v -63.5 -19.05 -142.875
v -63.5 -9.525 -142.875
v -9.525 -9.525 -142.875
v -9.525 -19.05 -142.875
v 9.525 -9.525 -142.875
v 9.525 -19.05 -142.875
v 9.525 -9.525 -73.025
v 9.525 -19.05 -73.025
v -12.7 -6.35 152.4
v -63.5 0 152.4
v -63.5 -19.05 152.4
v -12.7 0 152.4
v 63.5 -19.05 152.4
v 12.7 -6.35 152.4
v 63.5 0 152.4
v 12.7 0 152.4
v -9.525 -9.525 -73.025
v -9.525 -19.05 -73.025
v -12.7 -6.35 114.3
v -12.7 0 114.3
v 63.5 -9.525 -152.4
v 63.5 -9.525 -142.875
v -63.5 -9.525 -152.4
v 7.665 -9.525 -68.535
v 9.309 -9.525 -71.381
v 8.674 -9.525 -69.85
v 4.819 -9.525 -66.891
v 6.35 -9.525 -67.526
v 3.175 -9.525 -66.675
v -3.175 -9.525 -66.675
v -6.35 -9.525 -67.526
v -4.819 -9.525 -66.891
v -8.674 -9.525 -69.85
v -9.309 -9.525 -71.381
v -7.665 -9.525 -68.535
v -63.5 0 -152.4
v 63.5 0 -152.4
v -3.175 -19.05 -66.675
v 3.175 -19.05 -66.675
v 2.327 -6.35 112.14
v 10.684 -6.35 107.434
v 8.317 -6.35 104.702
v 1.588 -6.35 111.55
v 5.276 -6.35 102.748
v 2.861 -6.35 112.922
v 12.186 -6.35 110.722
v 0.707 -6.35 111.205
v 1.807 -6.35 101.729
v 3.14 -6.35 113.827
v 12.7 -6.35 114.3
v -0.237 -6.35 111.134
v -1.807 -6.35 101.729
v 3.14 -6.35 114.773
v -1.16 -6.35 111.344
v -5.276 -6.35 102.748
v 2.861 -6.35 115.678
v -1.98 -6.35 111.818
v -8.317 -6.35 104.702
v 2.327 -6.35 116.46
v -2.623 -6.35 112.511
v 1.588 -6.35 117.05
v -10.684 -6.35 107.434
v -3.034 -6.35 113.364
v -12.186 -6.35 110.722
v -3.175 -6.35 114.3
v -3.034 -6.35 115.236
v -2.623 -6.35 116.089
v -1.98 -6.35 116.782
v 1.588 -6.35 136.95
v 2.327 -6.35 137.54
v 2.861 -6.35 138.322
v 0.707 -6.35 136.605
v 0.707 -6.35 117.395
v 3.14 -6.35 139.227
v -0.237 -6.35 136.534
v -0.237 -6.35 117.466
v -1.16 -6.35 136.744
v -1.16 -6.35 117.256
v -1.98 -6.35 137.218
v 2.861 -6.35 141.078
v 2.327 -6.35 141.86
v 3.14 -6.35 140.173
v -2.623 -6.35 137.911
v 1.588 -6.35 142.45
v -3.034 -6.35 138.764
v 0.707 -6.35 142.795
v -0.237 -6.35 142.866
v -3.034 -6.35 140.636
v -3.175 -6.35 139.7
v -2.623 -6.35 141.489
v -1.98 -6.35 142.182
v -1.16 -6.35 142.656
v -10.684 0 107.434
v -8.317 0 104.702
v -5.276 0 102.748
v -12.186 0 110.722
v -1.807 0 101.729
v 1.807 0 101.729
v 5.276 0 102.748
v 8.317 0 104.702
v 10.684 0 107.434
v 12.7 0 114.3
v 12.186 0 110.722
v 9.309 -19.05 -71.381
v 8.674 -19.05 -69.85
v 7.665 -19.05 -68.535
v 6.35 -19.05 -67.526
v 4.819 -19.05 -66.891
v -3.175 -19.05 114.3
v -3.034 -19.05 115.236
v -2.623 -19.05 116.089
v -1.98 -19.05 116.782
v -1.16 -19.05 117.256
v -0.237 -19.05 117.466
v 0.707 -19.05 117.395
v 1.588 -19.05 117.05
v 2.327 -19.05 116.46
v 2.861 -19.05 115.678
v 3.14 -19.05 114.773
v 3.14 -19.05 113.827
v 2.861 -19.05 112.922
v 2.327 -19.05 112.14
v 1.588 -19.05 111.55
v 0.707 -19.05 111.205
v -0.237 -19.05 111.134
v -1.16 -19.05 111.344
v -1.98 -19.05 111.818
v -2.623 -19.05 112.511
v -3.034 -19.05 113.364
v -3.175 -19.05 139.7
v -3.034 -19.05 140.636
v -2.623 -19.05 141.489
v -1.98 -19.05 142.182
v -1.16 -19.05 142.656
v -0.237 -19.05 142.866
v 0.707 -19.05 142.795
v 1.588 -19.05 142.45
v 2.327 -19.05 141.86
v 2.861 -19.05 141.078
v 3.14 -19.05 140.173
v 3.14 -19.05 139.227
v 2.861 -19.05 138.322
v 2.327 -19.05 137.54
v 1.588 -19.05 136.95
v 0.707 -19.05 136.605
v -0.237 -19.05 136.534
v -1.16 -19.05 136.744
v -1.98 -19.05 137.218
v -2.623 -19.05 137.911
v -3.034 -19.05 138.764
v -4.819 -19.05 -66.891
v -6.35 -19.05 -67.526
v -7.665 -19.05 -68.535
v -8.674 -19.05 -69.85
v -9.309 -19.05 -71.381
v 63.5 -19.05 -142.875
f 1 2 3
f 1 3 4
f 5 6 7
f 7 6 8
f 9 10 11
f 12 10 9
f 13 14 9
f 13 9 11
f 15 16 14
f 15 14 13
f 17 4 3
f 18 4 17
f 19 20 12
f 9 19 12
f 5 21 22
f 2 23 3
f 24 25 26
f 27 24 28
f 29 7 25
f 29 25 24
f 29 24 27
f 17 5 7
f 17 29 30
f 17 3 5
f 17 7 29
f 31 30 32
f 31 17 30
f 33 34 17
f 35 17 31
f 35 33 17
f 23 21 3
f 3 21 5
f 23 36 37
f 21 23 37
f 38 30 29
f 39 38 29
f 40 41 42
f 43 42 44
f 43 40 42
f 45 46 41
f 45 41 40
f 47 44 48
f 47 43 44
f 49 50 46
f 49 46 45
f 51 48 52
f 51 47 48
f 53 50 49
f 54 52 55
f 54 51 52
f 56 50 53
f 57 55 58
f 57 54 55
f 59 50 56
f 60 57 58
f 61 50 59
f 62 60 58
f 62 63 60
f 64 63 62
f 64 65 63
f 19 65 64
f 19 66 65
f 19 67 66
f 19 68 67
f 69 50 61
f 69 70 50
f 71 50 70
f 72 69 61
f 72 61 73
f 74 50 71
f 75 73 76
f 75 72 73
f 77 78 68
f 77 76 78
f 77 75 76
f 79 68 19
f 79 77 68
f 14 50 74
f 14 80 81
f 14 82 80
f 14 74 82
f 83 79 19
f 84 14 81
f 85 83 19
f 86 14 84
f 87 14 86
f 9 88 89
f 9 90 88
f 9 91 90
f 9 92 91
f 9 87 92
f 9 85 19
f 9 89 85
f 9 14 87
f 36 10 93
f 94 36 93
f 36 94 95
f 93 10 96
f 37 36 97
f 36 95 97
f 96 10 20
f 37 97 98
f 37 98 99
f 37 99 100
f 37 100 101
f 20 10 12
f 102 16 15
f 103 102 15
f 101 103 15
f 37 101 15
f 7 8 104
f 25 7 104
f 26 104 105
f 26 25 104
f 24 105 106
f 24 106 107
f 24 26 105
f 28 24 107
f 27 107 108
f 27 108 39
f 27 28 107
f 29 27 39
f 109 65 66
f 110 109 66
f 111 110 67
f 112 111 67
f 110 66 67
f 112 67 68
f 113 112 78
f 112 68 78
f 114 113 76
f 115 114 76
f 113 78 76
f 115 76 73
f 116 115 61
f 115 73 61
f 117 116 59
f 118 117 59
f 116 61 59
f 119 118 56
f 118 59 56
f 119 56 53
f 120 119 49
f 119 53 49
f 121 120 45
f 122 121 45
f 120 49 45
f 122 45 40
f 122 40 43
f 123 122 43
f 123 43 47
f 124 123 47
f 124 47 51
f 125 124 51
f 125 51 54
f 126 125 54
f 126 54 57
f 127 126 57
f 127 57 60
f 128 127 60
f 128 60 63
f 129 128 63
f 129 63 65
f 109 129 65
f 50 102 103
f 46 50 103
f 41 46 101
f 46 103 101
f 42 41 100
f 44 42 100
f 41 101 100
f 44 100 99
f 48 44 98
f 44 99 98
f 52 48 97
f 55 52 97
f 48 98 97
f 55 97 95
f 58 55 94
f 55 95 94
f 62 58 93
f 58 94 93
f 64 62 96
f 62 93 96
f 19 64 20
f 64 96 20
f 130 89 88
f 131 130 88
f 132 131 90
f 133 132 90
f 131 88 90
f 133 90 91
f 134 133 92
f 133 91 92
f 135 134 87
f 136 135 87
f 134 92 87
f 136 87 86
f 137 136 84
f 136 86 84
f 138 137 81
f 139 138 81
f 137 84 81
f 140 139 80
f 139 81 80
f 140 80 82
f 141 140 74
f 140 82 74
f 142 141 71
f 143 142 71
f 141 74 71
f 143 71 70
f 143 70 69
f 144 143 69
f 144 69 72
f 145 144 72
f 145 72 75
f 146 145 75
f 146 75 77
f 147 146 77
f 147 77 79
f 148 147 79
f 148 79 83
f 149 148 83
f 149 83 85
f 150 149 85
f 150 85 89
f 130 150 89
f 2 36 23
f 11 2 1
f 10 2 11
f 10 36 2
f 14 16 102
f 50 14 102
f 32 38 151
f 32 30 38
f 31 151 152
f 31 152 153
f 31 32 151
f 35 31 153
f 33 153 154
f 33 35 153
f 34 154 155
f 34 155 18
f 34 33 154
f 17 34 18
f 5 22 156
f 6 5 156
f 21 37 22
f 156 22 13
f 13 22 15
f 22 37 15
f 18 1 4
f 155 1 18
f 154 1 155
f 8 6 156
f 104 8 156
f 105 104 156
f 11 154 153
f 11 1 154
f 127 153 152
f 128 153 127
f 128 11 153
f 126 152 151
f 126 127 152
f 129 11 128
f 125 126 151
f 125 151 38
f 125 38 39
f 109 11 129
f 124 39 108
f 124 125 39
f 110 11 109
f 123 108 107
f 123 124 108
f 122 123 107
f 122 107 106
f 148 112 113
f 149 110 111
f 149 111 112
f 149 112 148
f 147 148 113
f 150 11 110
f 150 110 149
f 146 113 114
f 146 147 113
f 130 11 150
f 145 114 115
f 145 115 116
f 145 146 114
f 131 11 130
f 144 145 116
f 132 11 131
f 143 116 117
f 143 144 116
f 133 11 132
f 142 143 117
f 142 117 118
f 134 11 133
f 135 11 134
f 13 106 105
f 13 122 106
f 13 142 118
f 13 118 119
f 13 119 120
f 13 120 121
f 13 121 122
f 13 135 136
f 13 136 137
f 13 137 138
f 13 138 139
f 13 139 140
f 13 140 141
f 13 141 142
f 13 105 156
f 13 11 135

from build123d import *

# Parameters (mm, degrees)
F0_W     = 127
F0_H     = 304.8
F1_DEPTH = 19.05
F3_DEPTH = 6.35
F4_R     = 3.175
F5_DEPTH = 12.701
F6_W     = 25.4
F6_H     = 9.525
F7_DEPTH = 127.001
F8_W     = 19.05
F8_H     = 76.2
F9_DEPTH = 9.525
F10_R    = 6.35


with BuildPart() as f1:
    # F0 (on Front) → F1 (new body)
    with BuildSketch(Plane.XZ):
        Rectangle(F0_W, F0_H)
    extrude(amount=F1_DEPTH)

    # F2 (on face) → F3 (cut)
    with BuildSketch(Plane(origin=(0, 0, 0), x_dir=(-1, 0, 0), z_dir=(0, 1, 0))):
        with BuildLine():
            Line((12.7, 114.3), (12.7, 152.4))
            ThreePointArc((12.7, 152.4), (0, 165.1), (-12.7, 152.4))
            Line((-12.7, 152.4), (-12.7, 114.3))
            ThreePointArc((-12.7, 114.3), (0, 101.6), (12.7, 114.3))
        make_face()
    extrude(amount=-F3_DEPTH, mode=Mode.SUBTRACT)

    # F4 (on face) → F5 (cut, through all)
    with BuildSketch(Plane(origin=(0, -6.35, 0), x_dir=(-1, 0, 0), z_dir=(0, 1, 0))):
        with Locations((0, 114.3)):
            Circle(F4_R)
        with Locations((0, 139.7)):
            Circle(F4_R)
    extrude(amount=-F5_DEPTH, mode=Mode.SUBTRACT)

    # F6 (on face) → F7 (cut, through all)
    with BuildSketch(Plane(origin=(-63.5, 0, 0), x_dir=(0, -1, 0), z_dir=(-1, 0, 0))):
        with Locations((22.225, -147.6375)):
            Rectangle(F6_W, F6_H)
    extrude(amount=-F7_DEPTH, mode=Mode.SUBTRACT)

    # F8 (on face) → F9 (cut)
    with BuildSketch(Plane.XZ.offset(19.05)):
        with Locations((0, -104.775)):
            Rectangle(F8_W, F8_H)
    extrude(amount=-F9_DEPTH, mode=Mode.SUBTRACT)

    # F10
    f10_edges = [f1.edges().sort_by_distance(p)[0] for p in [
        (-9.525, -14.2875, -66.675),
        (9.525, -14.2875, -66.675),
    ]]
    fillet(f10_edges, radius=F10_R)


with BuildPart() as f11_1:
    # F11: copy of F1
    add(f1.part)


solid = f1.part
